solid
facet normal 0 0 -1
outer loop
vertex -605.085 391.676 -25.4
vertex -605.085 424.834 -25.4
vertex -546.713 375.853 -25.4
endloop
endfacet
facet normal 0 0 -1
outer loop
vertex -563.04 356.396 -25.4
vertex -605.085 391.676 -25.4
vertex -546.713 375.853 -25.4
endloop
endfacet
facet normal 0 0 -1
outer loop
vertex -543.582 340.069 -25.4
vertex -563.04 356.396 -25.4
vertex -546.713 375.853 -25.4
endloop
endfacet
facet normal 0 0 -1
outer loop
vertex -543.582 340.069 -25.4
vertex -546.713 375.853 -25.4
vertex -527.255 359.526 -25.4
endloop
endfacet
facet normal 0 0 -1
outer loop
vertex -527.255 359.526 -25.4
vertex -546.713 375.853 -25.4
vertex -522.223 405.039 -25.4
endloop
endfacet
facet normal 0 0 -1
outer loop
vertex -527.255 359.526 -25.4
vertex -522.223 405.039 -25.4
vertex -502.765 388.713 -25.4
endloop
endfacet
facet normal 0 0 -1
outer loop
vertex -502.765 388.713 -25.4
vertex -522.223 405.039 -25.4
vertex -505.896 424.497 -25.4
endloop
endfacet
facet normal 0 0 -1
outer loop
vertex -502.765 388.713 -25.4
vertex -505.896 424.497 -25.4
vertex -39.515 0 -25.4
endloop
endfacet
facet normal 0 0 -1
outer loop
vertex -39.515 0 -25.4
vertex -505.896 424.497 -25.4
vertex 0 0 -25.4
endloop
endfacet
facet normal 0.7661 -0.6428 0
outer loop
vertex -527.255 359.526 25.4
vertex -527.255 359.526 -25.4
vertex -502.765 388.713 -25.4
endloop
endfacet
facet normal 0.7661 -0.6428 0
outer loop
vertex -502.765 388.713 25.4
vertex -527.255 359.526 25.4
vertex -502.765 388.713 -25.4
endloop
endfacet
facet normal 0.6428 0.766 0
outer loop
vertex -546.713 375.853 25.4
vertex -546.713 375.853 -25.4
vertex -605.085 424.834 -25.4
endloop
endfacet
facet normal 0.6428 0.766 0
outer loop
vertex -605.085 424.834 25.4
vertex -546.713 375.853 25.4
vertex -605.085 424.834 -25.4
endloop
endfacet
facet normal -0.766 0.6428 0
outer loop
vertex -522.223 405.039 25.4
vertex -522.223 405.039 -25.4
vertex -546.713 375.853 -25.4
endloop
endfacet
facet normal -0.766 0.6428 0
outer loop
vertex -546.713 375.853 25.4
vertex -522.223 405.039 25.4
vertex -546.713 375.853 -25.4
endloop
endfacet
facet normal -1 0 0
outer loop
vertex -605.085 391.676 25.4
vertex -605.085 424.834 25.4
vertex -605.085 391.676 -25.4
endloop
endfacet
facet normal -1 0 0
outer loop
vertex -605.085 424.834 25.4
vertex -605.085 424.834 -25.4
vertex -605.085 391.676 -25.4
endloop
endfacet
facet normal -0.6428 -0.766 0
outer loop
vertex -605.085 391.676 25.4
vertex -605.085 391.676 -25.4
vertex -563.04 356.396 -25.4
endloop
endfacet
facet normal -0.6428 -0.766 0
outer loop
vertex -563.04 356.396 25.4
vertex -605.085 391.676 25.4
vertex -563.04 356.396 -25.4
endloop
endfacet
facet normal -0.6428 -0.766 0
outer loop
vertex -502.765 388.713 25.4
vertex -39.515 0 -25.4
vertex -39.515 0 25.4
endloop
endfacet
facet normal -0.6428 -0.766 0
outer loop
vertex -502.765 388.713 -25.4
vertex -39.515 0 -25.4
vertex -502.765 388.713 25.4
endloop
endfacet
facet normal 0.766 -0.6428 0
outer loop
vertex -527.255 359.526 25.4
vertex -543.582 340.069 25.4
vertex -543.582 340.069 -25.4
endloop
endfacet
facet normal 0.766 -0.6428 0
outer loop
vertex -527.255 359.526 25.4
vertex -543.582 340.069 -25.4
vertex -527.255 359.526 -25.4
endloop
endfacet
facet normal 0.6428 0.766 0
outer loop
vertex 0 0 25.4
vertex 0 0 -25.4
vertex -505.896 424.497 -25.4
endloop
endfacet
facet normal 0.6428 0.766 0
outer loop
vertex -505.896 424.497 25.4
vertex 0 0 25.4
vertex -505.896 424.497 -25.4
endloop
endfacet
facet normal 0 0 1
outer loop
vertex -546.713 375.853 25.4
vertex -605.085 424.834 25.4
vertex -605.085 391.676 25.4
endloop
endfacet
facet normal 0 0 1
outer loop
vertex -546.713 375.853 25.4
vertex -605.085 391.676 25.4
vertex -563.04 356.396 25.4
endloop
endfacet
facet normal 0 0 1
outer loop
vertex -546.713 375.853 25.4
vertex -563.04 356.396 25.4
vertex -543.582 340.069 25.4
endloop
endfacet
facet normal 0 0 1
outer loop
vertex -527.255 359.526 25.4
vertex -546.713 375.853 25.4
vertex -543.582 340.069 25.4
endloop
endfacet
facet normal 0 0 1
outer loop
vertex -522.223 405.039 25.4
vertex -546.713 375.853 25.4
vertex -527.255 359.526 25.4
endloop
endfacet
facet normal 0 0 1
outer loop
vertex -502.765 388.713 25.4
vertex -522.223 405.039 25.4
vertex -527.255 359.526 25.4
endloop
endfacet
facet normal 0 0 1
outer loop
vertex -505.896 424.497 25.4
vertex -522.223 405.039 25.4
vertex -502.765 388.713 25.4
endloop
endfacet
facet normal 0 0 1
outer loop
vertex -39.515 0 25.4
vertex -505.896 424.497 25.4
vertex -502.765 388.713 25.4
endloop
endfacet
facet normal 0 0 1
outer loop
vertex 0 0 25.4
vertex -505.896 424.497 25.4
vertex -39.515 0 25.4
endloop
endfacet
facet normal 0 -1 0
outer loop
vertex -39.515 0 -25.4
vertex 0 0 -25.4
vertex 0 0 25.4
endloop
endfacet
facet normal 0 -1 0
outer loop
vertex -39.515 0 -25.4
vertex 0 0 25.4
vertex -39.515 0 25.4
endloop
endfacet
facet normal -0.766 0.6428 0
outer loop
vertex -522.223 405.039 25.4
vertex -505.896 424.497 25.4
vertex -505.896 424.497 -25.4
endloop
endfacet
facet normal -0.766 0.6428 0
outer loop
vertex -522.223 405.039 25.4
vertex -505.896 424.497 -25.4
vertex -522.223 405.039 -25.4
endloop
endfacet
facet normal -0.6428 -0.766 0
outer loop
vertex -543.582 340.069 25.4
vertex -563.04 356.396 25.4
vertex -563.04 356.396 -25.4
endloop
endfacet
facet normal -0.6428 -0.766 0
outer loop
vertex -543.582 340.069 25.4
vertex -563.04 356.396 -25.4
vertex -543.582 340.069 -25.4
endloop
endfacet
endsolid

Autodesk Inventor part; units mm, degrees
ref_plane "YZ Plane" through (0, 0, 0) normal (1, 0, 0) x (0, 1, 0)
ref_plane "XZ Plane" through (0, 0, 0) normal (0, 1, 0) x (-1, 0, 0)
ref_plane "XY Plane" through (0, 0, 0) normal (0, 0, 1) x (1, 0, 0)
sketch "Sketch1" plane through (0, 0, 0) normal (0, 0, 1) x (1, 0, 0)
  line L0 (0, 0) -> (-505.8958, 424.4969)
  line L1 (0, 0) -> (-228.6, 0) construction
  line L2 (0, 0) -> (-39.5154, 0)
  line L3 (-39.5154, 0) -> (-502.765, 388.7126)
  line L4 (-505.8958, 424.4969) -> (-522.2226, 405.0394)
  line L5 (-522.2226, 405.0394) -> (-546.7128, 375.8531)
  line L6 (-527.2552, 359.5263) -> (-502.765, 388.7126)
  line L7 (-546.7128, 375.8531) -> (-605.0854, 424.8335)
  line L8 (-605.0854, 391.6762) -> (-563.0396, 356.3956)
  line L9 (-543.582, 340.0688) -> (-527.2552, 359.5263)
  line L10 (-563.0396, 356.3956) -> (-543.582, 340.0688)
  line L11 (-228.6, 0) -> (-203.2, 0)
  line L12 (-605.0854, 424.8335) -> (-605.0854, 391.6762)
  line L13 (0, 0) -> (0, 391.6762) construction
  dimension "d2" = 660.4
  dimension "d3" = 25.4
  dimension "d4" = 40
  dimension "d25" = 50
  dimension "d34" = 63.5
  dimension "d35" = 76.2
extrude "Extrusion1" add sketch "Sketch1" along normal mid plane 50.8
properties part number "newFrame1x2piecsV03"
